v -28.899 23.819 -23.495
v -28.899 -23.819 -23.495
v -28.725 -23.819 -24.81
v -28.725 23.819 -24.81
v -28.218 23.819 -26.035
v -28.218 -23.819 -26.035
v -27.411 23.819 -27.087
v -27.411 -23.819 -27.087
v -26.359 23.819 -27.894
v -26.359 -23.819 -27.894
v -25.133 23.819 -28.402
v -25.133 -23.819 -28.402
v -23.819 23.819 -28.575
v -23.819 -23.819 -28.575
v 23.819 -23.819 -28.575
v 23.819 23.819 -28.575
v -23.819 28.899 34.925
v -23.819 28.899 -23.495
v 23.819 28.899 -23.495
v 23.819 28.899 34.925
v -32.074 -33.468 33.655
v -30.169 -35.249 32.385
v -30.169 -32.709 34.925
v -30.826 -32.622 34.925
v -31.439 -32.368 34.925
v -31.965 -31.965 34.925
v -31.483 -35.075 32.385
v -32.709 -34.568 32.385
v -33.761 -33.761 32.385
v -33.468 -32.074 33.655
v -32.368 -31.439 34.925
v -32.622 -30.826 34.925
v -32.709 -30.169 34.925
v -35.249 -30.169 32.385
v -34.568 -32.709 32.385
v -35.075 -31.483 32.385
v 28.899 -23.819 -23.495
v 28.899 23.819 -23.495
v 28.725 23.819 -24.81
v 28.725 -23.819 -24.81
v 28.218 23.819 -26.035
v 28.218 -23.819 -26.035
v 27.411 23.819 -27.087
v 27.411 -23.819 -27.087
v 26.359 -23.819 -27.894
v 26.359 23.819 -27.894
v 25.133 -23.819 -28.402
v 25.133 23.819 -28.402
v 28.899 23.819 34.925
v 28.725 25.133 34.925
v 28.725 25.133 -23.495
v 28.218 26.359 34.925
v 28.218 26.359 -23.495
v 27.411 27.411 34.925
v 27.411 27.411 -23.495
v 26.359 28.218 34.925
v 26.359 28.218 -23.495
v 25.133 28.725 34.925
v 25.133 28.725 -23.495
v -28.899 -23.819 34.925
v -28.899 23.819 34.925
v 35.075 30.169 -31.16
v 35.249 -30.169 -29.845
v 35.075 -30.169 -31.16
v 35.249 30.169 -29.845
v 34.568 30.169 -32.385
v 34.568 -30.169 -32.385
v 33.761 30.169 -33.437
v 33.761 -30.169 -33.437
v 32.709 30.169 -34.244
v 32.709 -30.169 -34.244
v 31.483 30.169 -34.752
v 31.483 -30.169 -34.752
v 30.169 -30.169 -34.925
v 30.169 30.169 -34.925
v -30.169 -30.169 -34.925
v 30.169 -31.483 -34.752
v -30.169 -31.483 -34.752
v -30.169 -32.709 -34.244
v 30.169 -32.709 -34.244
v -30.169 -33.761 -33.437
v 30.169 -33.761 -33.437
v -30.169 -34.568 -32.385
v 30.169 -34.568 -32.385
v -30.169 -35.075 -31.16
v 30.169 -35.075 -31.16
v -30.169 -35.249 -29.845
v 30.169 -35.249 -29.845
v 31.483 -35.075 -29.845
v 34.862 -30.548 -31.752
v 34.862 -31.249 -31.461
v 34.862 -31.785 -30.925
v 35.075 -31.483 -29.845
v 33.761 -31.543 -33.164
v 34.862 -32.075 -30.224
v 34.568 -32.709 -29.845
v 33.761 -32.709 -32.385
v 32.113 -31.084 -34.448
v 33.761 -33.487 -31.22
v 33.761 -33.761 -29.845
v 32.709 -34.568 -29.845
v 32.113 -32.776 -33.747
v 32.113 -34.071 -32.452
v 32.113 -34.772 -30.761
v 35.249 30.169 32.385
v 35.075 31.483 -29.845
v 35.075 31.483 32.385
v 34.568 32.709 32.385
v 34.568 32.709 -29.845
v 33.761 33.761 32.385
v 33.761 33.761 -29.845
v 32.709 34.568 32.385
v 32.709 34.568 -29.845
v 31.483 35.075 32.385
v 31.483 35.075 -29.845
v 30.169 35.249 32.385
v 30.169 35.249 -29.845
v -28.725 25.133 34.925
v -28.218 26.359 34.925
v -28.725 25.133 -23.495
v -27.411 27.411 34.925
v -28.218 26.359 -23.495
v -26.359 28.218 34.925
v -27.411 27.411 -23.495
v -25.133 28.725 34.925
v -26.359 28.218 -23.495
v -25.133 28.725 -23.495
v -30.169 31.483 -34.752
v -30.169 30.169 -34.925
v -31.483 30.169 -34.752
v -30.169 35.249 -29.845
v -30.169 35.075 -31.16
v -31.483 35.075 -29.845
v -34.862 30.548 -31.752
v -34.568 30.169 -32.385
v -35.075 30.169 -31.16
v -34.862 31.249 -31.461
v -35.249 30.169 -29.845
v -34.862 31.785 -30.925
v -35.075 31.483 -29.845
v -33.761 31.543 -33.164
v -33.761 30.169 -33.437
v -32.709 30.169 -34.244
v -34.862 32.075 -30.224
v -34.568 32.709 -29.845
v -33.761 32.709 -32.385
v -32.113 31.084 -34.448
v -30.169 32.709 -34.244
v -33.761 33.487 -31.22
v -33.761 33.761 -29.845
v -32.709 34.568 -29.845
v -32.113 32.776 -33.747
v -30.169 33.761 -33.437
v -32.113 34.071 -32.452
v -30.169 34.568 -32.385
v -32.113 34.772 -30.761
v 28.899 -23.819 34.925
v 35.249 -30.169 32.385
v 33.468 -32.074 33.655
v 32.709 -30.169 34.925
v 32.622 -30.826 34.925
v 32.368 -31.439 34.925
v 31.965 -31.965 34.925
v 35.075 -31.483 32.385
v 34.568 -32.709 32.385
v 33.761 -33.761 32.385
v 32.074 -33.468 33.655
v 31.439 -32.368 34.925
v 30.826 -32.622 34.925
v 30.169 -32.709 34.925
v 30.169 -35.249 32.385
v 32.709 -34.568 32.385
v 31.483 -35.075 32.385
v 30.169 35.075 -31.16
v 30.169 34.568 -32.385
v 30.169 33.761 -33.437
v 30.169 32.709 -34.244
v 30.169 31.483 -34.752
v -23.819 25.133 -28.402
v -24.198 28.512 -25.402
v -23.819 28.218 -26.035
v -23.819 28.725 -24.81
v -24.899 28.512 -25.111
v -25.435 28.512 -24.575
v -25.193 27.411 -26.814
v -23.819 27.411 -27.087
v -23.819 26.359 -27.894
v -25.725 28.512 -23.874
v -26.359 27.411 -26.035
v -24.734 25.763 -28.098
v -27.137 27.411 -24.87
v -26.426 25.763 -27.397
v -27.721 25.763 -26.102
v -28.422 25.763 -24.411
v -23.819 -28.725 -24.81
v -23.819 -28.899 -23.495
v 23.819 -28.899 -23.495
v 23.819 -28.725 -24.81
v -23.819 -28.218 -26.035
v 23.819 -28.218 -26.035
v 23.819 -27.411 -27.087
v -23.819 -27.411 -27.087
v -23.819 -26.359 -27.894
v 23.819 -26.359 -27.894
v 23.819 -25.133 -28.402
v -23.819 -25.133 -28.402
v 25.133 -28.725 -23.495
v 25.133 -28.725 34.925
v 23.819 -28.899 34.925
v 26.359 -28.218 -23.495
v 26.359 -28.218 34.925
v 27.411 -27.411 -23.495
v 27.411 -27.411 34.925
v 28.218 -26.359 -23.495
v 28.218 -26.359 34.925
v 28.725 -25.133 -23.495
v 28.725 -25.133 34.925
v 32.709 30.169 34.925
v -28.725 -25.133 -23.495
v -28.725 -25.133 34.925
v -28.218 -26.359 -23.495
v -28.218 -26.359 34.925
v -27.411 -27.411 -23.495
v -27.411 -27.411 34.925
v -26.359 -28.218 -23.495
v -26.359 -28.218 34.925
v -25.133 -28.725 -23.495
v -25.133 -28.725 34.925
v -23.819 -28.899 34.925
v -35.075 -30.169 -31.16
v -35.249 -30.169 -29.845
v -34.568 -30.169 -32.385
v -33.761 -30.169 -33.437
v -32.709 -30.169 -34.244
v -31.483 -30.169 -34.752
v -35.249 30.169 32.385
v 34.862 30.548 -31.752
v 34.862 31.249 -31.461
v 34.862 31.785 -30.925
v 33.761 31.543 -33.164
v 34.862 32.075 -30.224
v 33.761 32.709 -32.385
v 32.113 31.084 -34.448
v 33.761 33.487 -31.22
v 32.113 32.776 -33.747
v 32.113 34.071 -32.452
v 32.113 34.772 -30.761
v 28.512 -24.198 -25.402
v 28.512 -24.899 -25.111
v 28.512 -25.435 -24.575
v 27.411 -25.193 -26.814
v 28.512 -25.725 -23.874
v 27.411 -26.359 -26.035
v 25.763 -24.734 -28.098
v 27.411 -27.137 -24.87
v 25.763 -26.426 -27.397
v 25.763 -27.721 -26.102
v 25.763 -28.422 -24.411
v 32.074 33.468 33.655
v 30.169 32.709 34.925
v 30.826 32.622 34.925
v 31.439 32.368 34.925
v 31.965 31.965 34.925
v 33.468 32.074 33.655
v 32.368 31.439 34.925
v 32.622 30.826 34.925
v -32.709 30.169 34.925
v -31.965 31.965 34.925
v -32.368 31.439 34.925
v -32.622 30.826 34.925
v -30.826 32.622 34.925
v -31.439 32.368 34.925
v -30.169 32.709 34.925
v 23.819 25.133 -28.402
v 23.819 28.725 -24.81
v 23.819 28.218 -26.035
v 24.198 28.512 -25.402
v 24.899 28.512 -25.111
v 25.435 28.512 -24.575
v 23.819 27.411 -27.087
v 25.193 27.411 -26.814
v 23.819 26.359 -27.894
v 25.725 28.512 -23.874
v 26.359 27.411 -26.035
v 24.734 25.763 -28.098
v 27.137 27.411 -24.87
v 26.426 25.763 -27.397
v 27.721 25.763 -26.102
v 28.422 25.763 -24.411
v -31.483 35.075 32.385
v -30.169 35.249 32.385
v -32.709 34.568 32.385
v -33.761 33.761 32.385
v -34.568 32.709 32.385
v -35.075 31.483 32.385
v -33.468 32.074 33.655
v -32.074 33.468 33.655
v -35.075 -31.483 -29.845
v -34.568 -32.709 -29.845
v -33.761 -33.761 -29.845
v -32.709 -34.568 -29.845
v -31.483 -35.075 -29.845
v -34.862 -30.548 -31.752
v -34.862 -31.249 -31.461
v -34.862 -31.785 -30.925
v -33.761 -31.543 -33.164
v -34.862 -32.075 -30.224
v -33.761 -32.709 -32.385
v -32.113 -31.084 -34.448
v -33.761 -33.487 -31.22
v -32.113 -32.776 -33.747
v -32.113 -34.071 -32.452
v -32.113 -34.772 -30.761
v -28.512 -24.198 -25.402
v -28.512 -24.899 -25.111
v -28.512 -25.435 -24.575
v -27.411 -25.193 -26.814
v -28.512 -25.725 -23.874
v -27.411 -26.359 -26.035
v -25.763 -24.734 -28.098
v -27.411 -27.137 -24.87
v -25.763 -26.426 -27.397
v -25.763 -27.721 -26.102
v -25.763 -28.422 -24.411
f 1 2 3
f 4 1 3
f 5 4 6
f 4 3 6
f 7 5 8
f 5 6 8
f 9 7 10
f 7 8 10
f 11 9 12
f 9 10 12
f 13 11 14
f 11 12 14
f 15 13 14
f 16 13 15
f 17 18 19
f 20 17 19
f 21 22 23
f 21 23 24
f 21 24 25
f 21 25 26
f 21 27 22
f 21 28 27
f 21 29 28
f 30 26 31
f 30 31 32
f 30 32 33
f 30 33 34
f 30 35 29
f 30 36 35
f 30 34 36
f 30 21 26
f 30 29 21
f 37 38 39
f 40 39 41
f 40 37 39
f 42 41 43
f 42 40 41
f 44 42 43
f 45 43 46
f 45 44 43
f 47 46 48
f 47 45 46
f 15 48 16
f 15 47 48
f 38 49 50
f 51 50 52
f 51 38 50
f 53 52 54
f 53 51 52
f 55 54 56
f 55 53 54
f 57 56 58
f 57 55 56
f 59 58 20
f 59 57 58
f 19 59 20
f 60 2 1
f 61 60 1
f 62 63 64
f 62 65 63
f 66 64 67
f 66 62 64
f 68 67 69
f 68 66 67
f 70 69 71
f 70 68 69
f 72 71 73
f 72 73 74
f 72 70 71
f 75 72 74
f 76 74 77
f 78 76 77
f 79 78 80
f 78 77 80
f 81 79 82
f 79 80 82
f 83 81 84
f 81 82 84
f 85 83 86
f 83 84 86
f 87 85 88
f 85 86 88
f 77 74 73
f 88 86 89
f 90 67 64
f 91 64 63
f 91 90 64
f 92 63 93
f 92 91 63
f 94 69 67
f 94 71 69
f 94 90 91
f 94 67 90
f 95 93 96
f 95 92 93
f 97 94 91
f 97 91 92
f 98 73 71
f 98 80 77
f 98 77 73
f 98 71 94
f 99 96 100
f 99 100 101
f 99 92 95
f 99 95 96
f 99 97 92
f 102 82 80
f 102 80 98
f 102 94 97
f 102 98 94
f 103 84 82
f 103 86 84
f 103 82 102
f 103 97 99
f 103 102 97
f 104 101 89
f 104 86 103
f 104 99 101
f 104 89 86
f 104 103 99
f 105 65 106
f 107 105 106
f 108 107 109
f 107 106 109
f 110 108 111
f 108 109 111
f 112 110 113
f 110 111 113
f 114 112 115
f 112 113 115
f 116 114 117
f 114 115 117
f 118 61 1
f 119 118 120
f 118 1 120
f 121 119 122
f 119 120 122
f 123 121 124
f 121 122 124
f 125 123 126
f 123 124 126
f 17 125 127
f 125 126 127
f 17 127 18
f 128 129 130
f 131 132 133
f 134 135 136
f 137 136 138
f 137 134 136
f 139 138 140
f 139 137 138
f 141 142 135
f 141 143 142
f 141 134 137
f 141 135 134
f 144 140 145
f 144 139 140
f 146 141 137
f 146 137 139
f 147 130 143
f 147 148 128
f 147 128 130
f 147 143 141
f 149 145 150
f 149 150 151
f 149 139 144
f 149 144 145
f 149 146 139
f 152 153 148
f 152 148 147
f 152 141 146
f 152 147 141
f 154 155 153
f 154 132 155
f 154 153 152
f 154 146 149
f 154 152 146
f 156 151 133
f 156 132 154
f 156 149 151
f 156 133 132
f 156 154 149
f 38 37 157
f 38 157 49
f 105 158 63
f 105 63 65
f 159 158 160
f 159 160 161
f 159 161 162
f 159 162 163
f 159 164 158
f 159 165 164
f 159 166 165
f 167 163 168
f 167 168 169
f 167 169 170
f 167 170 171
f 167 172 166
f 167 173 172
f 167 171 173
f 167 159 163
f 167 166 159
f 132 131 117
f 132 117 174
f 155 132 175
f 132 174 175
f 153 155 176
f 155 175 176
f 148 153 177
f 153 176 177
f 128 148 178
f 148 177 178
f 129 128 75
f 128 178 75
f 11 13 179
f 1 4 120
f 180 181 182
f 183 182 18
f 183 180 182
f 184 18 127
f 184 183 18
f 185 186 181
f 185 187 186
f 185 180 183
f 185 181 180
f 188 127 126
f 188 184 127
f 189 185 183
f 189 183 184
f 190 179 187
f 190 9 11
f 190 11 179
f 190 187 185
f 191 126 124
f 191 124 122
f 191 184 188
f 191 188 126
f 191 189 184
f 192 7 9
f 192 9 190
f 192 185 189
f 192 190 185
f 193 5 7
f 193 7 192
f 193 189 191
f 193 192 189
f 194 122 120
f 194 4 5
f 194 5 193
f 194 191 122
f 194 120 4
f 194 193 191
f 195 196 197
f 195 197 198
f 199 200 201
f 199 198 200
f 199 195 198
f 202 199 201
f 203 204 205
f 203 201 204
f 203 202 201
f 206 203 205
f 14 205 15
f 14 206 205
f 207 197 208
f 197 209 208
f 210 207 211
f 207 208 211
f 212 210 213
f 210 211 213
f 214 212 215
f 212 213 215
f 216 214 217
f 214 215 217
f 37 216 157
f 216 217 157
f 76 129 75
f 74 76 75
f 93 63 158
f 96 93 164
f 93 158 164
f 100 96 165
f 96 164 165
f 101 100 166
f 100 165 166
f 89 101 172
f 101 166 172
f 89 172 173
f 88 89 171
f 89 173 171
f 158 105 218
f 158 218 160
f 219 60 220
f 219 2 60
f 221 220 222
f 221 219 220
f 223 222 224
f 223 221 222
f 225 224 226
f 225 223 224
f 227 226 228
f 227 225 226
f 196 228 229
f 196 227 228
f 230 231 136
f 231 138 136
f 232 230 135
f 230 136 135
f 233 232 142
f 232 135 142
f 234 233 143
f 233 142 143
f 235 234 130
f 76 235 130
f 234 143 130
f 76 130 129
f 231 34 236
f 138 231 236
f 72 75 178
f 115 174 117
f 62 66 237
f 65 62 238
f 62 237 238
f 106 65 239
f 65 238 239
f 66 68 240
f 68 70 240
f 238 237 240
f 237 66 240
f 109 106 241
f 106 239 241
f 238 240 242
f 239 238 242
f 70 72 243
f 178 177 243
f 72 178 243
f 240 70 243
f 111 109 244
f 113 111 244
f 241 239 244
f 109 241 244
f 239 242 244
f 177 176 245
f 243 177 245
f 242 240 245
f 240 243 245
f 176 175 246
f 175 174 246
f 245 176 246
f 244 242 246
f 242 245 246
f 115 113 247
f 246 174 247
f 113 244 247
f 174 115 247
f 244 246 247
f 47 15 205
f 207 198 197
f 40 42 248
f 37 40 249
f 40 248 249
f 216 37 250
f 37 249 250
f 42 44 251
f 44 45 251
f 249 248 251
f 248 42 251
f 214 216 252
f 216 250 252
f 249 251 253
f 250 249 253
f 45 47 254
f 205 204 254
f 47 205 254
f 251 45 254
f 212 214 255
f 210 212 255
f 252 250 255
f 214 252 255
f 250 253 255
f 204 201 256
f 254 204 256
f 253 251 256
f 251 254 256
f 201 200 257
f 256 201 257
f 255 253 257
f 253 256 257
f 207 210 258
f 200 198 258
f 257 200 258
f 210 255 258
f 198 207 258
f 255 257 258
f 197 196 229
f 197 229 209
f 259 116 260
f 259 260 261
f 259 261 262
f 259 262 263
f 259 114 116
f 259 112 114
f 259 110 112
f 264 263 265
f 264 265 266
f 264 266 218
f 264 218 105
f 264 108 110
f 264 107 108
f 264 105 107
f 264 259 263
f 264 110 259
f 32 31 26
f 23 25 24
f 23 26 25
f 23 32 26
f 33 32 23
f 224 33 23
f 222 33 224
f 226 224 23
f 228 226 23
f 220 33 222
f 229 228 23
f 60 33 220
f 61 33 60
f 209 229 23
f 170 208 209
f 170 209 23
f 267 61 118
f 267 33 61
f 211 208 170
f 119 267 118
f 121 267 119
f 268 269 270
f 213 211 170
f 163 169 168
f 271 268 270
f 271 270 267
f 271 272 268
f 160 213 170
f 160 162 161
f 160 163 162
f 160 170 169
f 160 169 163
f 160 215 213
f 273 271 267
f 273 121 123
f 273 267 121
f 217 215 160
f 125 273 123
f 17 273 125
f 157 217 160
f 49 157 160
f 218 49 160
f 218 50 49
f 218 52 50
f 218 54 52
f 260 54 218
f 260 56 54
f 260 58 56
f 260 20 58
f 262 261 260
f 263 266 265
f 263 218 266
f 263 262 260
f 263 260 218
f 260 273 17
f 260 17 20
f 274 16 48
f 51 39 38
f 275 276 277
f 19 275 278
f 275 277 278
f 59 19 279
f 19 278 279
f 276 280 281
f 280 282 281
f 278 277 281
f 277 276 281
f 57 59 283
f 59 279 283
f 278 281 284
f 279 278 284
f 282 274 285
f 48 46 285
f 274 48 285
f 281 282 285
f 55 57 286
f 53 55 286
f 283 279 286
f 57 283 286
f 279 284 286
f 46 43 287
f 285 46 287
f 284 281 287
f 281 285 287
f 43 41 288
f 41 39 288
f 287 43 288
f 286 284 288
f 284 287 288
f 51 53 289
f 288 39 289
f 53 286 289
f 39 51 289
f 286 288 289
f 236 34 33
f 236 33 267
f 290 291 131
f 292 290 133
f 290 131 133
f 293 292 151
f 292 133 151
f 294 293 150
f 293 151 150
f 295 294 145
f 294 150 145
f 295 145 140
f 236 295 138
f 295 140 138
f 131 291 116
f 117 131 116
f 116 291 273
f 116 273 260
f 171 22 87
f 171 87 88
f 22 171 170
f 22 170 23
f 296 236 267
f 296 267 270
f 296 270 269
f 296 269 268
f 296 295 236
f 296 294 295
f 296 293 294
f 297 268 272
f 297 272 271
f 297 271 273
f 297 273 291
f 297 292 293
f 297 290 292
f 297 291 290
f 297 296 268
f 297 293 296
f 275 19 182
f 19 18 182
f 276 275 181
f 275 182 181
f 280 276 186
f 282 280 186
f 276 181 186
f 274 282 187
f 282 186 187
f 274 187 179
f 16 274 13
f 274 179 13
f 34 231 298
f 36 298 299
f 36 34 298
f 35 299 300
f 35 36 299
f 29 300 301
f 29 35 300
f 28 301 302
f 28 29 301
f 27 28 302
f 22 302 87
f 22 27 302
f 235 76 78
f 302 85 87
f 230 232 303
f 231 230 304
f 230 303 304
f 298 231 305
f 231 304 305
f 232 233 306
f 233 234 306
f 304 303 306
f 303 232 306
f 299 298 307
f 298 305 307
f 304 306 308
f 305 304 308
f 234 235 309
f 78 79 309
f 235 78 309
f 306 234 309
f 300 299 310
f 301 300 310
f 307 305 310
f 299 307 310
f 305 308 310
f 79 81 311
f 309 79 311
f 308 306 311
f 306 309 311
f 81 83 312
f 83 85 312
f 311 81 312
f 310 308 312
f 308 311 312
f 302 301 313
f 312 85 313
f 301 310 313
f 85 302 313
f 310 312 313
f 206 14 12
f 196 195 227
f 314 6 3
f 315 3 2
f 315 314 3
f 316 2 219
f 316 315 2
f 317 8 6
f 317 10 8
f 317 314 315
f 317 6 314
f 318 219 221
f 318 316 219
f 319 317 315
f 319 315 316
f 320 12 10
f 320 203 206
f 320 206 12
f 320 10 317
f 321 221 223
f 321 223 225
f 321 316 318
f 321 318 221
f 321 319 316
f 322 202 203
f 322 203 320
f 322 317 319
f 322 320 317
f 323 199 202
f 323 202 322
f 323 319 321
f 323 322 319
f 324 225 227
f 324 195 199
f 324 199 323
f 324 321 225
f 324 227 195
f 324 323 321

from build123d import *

# Parameters (mm, degrees)
F0_W     = 70.4970285296
F0_H     = 70.4970285296
F1_DEPTH = 34.925
F2_T     = -6.35
F3_R     = 5.08
F4_SIZE  = 2.54


with BuildPart() as f1:
    # F0 (on Top) → F1 (new body, symmetric)
    with BuildSketch(Plane.XY):
        Rectangle(F0_W, F0_H)
    extrude(amount=F1_DEPTH, both=True)

    # F2
    f2_openings = [f1.faces().sort_by_distance(p)[0] for p in [
        (0, 0, 34.925),
    ]]
    offset(amount=F2_T, openings=f2_openings)

    # F3
    f3_edges = [f1.edges().sort_by_distance(p)[0] for p in [
        (0, 35.248514, -34.925),
        (0, -35.248514, -34.925),
        (35.248514, 0, -34.925),
        (-35.248514, 0, -34.925),
        (0, -28.898514, -28.575),
        (28.898514, 0, -28.575),
        (-28.898514, 0, -28.575),
        (0, 28.898514, -28.575),
        (35.248514, -35.248514, 0),
        (35.248514, 35.248514, 0),
        (-35.248514, 35.248514, 0),
        (-35.248514, -35.248514, 0),
        (-28.898514, 28.898514, 3.175),
        (28.898514, 28.898514, 3.175),
        (28.898514, -28.898514, 3.175),
        (-28.898514, -28.898514, 3.175),
    ]]
    fillet(f3_edges, radius=F3_R)

    # F4
    f4_edges = [f1.edges().sort_by_distance(p)[0] for p in [
        (-35.248514, 0, 34.925),
    ]]
    chamfer(f4_edges, length=F4_SIZE)


solid = f1.part
